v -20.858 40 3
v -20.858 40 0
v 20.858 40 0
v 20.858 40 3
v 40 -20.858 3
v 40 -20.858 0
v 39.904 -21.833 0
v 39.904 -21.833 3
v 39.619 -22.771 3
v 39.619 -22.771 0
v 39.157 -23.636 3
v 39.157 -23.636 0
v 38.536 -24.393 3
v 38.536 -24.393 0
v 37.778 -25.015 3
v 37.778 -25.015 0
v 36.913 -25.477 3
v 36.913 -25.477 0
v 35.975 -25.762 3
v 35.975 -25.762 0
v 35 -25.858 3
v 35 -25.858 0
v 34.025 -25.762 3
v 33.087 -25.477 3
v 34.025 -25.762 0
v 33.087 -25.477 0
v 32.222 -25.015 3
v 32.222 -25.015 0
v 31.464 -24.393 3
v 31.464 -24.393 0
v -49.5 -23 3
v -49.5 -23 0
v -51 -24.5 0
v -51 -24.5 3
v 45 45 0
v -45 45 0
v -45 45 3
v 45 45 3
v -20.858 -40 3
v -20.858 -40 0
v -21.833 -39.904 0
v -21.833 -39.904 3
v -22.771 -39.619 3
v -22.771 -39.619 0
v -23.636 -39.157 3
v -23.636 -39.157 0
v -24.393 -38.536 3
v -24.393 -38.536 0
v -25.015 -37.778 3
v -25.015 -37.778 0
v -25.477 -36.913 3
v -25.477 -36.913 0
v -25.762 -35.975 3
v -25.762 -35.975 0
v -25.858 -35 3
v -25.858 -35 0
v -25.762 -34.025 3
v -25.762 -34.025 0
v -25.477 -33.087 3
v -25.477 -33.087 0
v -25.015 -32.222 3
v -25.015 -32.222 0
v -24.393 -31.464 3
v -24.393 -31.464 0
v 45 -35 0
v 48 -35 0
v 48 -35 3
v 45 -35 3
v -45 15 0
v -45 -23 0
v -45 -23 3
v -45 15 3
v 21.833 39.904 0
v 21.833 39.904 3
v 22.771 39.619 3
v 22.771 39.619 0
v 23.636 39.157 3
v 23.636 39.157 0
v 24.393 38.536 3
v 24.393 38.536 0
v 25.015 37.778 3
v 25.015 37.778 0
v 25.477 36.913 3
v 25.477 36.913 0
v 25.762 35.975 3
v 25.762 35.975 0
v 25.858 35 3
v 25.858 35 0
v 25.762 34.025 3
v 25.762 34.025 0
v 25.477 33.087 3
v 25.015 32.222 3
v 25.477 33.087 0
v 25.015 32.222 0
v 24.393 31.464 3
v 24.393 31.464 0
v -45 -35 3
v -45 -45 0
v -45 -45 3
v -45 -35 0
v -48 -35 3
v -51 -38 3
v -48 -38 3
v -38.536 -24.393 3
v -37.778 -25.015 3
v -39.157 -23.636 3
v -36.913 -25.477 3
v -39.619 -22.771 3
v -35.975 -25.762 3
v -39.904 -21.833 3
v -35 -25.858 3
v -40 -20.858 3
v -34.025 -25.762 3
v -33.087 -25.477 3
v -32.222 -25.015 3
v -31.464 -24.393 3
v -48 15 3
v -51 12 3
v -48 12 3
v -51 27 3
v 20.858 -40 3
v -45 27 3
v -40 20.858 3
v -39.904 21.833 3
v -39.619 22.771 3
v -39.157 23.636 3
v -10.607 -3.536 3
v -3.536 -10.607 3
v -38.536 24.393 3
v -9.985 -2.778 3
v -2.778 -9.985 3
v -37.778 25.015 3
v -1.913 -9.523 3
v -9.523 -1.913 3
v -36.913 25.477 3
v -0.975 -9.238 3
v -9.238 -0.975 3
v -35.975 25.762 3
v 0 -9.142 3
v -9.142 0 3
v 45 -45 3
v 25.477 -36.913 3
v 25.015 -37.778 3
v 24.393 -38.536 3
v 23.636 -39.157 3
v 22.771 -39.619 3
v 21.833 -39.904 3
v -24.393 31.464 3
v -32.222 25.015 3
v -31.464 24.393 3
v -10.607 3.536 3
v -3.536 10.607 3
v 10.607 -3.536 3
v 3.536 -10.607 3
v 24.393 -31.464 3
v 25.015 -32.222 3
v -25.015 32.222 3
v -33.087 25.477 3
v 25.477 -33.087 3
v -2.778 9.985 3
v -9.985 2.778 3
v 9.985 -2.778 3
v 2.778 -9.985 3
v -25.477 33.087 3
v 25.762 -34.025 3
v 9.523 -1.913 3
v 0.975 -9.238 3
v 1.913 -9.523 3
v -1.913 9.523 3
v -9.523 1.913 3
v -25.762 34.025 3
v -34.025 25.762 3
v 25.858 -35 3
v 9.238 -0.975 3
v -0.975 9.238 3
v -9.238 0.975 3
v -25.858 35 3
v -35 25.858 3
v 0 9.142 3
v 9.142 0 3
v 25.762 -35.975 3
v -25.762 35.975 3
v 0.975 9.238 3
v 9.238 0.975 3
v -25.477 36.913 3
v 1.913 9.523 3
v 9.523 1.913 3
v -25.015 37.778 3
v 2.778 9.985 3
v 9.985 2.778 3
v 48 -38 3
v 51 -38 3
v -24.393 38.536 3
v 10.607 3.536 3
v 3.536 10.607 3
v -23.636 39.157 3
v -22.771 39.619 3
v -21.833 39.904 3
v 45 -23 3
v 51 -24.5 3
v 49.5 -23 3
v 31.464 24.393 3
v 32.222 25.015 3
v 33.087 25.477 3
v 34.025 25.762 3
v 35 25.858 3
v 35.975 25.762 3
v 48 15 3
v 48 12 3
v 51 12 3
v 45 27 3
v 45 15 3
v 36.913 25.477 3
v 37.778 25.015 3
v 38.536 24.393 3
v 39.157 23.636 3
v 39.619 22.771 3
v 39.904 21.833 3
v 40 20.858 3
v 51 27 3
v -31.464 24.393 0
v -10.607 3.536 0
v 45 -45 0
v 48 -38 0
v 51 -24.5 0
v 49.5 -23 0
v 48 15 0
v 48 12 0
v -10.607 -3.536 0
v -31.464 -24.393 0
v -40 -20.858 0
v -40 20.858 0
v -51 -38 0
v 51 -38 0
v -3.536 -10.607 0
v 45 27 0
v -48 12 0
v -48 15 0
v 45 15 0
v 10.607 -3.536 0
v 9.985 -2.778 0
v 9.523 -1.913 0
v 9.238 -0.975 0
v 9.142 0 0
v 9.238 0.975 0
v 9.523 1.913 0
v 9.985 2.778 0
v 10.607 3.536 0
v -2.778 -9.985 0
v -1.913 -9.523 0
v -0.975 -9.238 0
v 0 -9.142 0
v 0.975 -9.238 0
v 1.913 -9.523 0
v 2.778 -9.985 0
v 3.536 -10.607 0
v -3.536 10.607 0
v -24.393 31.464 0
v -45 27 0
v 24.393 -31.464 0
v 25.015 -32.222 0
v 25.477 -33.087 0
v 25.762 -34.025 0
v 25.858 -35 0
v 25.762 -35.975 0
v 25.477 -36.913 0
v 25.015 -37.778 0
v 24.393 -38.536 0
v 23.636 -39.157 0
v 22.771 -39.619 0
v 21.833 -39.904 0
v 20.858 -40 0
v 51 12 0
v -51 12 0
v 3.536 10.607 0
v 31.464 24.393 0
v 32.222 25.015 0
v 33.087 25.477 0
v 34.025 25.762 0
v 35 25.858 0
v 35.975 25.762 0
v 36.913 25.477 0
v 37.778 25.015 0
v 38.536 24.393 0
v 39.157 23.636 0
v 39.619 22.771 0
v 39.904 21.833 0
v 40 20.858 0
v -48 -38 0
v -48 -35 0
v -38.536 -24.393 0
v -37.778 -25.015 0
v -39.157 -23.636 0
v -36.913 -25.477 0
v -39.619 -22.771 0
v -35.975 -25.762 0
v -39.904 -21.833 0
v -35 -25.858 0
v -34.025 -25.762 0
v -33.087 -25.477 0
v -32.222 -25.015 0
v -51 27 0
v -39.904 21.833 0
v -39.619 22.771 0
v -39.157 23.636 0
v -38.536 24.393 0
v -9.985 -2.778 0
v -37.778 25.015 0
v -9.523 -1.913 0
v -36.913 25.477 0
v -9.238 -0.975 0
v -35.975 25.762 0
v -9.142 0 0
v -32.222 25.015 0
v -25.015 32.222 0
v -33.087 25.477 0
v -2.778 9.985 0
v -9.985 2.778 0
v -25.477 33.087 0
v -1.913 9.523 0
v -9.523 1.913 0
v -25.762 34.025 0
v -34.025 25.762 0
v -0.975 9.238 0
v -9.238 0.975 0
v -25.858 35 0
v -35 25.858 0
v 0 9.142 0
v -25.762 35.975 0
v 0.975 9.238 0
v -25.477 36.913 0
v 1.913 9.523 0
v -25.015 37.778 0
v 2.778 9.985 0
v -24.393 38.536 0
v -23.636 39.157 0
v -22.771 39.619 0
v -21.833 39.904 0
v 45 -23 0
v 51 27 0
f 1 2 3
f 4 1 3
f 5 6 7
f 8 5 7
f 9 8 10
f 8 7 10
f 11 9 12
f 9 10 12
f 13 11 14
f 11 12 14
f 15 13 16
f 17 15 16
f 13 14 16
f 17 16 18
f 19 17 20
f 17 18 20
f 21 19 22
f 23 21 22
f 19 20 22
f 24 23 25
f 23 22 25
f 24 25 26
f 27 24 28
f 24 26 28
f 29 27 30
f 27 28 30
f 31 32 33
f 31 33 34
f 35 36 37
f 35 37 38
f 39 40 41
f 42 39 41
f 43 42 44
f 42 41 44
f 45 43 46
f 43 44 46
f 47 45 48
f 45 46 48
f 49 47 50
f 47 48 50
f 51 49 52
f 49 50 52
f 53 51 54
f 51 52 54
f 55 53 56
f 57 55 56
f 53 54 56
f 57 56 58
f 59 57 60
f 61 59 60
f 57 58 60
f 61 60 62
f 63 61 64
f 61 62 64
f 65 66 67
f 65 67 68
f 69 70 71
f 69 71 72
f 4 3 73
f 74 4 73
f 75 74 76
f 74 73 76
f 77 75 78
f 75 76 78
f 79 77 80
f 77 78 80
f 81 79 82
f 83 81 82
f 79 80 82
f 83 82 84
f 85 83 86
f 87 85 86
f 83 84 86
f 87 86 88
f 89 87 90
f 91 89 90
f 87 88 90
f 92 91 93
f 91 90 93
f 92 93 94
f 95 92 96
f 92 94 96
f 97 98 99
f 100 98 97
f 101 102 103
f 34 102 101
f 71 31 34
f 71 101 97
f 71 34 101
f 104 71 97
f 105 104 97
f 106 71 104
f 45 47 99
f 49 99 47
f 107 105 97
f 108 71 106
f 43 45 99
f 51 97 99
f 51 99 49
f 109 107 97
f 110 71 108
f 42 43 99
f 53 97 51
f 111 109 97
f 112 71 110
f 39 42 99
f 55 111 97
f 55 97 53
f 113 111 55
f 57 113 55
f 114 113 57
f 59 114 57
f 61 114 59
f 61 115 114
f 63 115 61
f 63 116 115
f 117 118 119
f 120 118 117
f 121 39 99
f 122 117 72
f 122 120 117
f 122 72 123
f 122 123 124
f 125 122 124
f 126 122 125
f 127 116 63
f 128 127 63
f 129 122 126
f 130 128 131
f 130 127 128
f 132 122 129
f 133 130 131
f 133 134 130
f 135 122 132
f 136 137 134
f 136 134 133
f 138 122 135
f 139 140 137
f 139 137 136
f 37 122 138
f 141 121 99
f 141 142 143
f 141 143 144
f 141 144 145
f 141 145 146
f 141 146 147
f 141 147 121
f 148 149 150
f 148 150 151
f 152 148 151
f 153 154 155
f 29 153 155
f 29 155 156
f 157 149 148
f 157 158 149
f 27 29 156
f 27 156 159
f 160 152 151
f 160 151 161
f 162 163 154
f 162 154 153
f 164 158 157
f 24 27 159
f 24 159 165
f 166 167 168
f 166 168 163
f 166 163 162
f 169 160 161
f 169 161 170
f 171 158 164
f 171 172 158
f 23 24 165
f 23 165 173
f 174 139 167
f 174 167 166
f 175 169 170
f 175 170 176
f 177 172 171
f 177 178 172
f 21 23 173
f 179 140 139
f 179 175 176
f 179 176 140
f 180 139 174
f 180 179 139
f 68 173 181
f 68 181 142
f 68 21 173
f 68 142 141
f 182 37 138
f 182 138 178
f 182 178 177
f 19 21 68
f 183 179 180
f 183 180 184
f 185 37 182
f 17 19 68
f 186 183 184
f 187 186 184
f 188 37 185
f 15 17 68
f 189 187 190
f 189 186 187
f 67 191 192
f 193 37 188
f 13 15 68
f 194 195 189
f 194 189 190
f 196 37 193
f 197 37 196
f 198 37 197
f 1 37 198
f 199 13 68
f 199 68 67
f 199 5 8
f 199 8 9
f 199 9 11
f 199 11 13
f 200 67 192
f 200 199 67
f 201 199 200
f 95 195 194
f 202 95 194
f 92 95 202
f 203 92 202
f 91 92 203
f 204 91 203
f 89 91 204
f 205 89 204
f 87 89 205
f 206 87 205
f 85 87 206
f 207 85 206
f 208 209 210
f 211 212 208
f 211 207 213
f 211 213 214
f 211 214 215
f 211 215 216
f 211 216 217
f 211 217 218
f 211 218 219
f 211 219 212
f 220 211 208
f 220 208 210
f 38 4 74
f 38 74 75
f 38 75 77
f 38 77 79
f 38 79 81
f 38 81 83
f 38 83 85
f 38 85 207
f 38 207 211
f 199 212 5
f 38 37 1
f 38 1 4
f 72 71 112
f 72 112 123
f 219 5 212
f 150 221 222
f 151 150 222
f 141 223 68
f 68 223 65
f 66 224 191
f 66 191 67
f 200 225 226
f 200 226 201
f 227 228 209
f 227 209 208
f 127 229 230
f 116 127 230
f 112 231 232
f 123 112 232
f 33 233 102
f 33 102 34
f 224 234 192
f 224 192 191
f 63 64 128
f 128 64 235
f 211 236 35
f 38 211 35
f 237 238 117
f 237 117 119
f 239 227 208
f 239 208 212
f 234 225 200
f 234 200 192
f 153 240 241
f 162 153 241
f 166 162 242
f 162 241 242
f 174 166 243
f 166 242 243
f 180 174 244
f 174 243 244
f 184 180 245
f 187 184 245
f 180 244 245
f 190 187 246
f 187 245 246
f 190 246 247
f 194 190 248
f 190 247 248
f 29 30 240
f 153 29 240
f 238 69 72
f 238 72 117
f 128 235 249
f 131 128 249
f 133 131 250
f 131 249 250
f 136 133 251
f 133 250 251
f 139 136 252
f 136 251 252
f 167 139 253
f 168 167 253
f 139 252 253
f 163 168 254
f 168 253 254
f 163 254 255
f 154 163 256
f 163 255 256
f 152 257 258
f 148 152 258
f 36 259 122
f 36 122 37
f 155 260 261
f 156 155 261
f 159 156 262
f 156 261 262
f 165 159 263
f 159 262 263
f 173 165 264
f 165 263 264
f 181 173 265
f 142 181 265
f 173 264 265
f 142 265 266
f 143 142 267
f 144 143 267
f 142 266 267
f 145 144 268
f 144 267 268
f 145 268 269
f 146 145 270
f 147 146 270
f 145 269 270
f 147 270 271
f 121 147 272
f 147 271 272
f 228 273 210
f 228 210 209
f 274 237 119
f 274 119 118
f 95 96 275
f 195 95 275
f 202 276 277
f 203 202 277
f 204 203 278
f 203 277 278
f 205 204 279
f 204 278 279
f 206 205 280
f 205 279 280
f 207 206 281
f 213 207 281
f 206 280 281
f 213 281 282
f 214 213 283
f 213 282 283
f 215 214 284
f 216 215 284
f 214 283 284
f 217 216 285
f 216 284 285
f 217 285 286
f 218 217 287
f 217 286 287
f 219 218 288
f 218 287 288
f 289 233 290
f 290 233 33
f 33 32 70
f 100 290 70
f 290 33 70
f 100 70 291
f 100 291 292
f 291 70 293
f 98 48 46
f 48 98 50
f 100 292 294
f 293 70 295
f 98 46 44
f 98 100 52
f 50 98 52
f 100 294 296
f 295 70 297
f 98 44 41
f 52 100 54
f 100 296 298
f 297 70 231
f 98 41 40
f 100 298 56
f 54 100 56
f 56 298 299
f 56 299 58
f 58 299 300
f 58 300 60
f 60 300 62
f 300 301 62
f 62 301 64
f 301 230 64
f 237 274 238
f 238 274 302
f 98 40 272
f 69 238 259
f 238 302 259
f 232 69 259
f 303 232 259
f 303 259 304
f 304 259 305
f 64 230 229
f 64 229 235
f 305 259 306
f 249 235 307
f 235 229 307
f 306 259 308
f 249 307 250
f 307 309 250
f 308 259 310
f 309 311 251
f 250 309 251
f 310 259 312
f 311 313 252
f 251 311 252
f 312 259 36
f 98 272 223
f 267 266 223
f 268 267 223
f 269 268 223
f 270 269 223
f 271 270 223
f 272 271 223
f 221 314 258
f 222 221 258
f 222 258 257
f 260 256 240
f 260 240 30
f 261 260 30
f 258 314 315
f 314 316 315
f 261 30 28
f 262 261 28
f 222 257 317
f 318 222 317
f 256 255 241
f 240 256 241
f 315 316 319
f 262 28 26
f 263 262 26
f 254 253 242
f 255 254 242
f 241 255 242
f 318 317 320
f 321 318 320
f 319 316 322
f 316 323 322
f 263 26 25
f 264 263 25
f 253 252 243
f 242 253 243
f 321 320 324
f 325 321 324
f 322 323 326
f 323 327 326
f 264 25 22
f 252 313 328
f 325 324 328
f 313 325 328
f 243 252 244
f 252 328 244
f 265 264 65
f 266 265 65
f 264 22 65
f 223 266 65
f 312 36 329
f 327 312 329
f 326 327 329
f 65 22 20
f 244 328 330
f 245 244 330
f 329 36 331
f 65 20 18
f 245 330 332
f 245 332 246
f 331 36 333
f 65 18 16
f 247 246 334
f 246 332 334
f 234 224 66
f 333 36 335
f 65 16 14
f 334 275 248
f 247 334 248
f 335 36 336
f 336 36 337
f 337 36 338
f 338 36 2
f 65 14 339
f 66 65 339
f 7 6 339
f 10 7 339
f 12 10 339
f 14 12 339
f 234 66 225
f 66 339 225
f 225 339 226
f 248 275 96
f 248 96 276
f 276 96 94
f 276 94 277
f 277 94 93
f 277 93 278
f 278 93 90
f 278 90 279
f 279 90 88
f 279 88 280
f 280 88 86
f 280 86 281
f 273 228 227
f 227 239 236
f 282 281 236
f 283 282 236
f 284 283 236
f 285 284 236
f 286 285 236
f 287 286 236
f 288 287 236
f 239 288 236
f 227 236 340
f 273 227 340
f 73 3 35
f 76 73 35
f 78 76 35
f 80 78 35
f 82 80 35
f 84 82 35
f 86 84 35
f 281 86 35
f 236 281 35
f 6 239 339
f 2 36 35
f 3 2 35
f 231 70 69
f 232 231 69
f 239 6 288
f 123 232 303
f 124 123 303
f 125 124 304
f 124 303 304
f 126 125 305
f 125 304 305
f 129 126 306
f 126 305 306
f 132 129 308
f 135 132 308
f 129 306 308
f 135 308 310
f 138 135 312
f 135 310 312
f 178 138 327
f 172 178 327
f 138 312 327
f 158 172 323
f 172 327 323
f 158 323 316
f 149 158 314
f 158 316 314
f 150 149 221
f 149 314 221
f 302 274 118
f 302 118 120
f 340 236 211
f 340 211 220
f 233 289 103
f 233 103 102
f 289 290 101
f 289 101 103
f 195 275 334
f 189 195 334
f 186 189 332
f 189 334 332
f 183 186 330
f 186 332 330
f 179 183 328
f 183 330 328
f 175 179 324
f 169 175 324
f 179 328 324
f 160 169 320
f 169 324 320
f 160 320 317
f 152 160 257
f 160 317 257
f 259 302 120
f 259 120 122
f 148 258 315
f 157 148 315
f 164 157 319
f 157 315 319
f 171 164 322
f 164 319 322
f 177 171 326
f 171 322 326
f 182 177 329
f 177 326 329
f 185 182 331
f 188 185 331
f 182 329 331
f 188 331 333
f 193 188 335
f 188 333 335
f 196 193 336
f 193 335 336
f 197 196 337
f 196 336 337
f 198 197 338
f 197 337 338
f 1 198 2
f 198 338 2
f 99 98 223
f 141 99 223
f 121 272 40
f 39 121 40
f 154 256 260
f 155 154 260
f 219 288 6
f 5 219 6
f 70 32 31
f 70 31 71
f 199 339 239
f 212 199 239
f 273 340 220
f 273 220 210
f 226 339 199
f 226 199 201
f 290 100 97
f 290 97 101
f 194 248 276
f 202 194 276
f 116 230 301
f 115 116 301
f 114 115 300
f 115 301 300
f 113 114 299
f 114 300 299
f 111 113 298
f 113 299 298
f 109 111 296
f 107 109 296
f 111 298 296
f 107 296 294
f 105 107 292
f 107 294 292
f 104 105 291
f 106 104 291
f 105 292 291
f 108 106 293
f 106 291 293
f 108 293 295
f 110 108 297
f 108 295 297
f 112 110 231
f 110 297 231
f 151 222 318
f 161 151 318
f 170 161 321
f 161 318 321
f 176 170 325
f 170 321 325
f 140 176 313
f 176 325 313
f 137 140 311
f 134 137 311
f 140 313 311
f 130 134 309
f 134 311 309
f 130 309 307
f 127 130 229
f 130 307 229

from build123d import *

# Parameters (mm, degrees)
F0_W     = 90
F0_H     = 90
F1_DEPTH = 3
F3_DEPTH = 3
F4_SIZE  = 1.5


with BuildPart() as f1:
    # F0 (on Top) → F1 (new body)
    with BuildSketch(Plane.XY):
        Rectangle(F0_W, F0_H)
        with BuildLine():
            Line((3.535534, -10.606602), (24.393397, -31.464465))
            ThreePointArc((24.393397, -31.464465), (25.477261, -36.913416), (20.857863, -39.999999))
            Line((20.857863, -39.999999), (-20.857864, -39.999999))
            ThreePointArc((-20.857864, -39.999999), (-25.477261, -36.913416), (-24.393398, -31.464465))
            Line((-24.393398, -31.464465), (-3.535534, -10.606602))
            ThreePointArc((-3.535534, -10.606602), (0, -9.142136), (3.535534, -10.606602))
        make_face(mode=Mode.SUBTRACT)
        with BuildLine():
            ThreePointArc((-40, 20.857864), (-36.913417, 25.477262), (-31.464466, 24.393398))
            Line((-31.464466, 24.393398), (-10.606602, 3.535534))
            ThreePointArc((-10.606602, 3.535534), (-9.142136, 0), (-10.606602, -3.535534))
            Line((-10.606602, -3.535534), (-31.464466, -24.393398))
            ThreePointArc((-31.464466, -24.393398), (-36.913417, -25.477262), (-40, -20.857864))
            Line((-40, -20.857864), (-40, 20.857864))
        make_face(mode=Mode.SUBTRACT)
        with BuildLine():
            ThreePointArc((20.857863, 39.999999), (25.477261, 36.913416), (24.393397, 31.464465))
            Line((24.393397, 31.464465), (3.535534, 10.606602))
            ThreePointArc((3.535534, 10.606602), (0, 9.142136), (-3.535534, 10.606602))
            Line((-3.535534, 10.606602), (-24.393398, 31.464465))
            ThreePointArc((-24.393398, 31.464465), (-25.477261, 36.913416), (-20.857864, 39.999999))
            Line((-20.857864, 39.999999), (20.857863, 39.999999))
        make_face(mode=Mode.SUBTRACT)
        with BuildLine():
            Line((10.606602, 3.535534), (31.464466, 24.393398))
            ThreePointArc((31.464466, 24.393398), (36.913417, 25.477262), (40, 20.857864))
            Line((40, 20.857864), (40, -20.857864))
            ThreePointArc((40, -20.857864), (36.913417, -25.477262), (31.464466, -24.393398))
            Line((31.464466, -24.393398), (10.606602, -3.535534))
            ThreePointArc((10.606602, -3.535534), (9.142136, 0), (10.606602, 3.535534))
        make_face(mode=Mode.SUBTRACT)
    extrude(amount=F1_DEPTH)

    # F2 (on face) → F3 (join, through all)
    with BuildSketch(Plane(origin=(0, 0, 0), x_dir=(1, 0, 0), z_dir=(0, 0, -1))):
        Polygon((45, -15), (45, -27), (51, -27), (51, -12), (48, -12), (48, -15), align=None)
        Polygon((45, 35), (45, 23), (51, 23), (51, 38), (48, 38), (48, 35), align=None)
        Polygon((-45, -15), (-48, -15), (-48, -12), (-51, -12), (-51, -27), (-45, -27), align=None)
        Polygon((-45, 23), (-45, 35), (-48, 35), (-48, 38), (-51, 38), (-51, 23), align=None)
    extrude(amount=-F3_DEPTH)

    # F4
    f4_edges = [f1.edges().sort_by_distance(p)[0] for p in [
        (-51, -23, 1.5),
        (51, -23, 1.5),
    ]]
    chamfer(f4_edges, length=F4_SIZE)


solid = f1.part
